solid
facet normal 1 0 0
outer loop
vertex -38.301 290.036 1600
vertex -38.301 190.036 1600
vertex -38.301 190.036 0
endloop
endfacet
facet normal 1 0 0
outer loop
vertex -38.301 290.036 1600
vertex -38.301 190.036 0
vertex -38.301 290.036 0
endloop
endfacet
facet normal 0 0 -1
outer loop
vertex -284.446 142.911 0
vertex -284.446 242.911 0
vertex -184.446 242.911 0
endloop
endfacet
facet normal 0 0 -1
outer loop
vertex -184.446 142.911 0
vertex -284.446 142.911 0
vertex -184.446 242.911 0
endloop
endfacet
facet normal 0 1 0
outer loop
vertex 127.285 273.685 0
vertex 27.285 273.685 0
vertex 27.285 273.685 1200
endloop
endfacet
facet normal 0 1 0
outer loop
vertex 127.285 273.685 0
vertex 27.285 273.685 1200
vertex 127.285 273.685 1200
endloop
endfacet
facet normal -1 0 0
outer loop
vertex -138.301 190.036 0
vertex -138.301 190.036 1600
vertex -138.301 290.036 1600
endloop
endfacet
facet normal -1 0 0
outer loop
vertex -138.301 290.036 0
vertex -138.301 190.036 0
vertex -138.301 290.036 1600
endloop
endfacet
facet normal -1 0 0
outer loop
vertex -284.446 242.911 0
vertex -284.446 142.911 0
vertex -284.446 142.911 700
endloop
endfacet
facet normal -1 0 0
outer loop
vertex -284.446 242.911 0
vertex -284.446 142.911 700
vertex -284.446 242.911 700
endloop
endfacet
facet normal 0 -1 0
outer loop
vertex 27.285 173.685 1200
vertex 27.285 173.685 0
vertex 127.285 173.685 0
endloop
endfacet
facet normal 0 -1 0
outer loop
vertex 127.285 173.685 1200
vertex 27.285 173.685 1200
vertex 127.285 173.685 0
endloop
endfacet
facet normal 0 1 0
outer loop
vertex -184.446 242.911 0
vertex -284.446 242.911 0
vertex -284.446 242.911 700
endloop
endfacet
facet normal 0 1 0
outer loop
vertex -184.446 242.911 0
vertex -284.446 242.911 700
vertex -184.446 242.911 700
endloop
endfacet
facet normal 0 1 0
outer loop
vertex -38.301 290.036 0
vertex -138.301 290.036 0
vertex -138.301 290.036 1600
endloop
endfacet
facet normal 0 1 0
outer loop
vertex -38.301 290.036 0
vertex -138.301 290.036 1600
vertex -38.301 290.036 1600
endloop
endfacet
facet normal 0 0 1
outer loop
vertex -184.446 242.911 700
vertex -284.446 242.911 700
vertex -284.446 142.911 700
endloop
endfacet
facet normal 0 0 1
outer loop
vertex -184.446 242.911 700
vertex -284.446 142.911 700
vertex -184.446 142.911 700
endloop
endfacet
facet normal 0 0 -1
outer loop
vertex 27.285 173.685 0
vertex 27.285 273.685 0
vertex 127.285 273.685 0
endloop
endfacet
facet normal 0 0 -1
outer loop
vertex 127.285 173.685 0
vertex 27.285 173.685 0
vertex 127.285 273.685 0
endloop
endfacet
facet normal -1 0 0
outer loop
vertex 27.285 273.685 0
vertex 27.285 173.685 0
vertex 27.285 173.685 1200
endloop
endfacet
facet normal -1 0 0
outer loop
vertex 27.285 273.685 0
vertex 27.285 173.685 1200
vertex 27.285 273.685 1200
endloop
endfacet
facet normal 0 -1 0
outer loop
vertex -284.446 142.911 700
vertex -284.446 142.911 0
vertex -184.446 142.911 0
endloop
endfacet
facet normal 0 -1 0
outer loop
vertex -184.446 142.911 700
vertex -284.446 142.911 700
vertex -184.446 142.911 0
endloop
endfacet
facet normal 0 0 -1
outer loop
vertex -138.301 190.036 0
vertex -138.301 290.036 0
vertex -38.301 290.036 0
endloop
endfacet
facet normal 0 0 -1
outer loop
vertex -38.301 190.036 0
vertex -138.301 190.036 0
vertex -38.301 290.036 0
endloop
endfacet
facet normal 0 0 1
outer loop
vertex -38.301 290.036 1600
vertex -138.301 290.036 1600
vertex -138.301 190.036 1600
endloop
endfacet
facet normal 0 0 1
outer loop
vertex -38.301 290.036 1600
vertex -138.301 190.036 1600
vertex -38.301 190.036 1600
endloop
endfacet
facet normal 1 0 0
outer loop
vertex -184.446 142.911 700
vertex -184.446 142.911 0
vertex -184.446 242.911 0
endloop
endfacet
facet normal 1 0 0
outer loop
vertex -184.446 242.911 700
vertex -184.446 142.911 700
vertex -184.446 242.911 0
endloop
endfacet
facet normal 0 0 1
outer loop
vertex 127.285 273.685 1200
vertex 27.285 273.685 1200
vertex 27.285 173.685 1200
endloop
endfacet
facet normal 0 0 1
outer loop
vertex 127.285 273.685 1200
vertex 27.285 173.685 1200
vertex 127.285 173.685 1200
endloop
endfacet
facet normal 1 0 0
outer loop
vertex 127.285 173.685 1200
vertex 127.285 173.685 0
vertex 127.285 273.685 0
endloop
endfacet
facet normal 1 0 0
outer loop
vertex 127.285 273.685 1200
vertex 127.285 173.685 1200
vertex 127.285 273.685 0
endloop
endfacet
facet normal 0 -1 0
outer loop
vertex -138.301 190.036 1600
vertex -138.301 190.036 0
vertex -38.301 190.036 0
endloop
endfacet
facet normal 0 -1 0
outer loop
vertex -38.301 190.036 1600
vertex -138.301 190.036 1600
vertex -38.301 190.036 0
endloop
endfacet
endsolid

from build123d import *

# Parameters (mm, degrees)
F0_W     = 100
F0_H     = 100
F1_DEPTH = 700
F2_DEPTH = 1600
F3_DEPTH = 1200


with BuildPart() as f1:
    # F0 (on Top) → F1 (new body)
    with BuildSketch(Plane.XY):
        with Locations((-234.446402, 192.911209)):
            Rectangle(F0_W, F0_H)
    extrude(amount=F1_DEPTH)


with BuildPart() as f2:
    # F0 (on Top) → F2 (new body)
    with BuildSketch(Plane.XY):
        with Locations((-88.301169, 240.036038)):
            Rectangle(F0_W, F0_H)
    extrude(amount=F2_DEPTH)


with BuildPart() as f3:
    # F0 (on Top) → F3 (new body)
    with BuildSketch(Plane.XY):
        with Locations((77.285348, 223.684713)):
            Rectangle(F0_W, F0_H)
    extrude(amount=F3_DEPTH)


solid = Compound([f1.part, f2.part, f3.part])
